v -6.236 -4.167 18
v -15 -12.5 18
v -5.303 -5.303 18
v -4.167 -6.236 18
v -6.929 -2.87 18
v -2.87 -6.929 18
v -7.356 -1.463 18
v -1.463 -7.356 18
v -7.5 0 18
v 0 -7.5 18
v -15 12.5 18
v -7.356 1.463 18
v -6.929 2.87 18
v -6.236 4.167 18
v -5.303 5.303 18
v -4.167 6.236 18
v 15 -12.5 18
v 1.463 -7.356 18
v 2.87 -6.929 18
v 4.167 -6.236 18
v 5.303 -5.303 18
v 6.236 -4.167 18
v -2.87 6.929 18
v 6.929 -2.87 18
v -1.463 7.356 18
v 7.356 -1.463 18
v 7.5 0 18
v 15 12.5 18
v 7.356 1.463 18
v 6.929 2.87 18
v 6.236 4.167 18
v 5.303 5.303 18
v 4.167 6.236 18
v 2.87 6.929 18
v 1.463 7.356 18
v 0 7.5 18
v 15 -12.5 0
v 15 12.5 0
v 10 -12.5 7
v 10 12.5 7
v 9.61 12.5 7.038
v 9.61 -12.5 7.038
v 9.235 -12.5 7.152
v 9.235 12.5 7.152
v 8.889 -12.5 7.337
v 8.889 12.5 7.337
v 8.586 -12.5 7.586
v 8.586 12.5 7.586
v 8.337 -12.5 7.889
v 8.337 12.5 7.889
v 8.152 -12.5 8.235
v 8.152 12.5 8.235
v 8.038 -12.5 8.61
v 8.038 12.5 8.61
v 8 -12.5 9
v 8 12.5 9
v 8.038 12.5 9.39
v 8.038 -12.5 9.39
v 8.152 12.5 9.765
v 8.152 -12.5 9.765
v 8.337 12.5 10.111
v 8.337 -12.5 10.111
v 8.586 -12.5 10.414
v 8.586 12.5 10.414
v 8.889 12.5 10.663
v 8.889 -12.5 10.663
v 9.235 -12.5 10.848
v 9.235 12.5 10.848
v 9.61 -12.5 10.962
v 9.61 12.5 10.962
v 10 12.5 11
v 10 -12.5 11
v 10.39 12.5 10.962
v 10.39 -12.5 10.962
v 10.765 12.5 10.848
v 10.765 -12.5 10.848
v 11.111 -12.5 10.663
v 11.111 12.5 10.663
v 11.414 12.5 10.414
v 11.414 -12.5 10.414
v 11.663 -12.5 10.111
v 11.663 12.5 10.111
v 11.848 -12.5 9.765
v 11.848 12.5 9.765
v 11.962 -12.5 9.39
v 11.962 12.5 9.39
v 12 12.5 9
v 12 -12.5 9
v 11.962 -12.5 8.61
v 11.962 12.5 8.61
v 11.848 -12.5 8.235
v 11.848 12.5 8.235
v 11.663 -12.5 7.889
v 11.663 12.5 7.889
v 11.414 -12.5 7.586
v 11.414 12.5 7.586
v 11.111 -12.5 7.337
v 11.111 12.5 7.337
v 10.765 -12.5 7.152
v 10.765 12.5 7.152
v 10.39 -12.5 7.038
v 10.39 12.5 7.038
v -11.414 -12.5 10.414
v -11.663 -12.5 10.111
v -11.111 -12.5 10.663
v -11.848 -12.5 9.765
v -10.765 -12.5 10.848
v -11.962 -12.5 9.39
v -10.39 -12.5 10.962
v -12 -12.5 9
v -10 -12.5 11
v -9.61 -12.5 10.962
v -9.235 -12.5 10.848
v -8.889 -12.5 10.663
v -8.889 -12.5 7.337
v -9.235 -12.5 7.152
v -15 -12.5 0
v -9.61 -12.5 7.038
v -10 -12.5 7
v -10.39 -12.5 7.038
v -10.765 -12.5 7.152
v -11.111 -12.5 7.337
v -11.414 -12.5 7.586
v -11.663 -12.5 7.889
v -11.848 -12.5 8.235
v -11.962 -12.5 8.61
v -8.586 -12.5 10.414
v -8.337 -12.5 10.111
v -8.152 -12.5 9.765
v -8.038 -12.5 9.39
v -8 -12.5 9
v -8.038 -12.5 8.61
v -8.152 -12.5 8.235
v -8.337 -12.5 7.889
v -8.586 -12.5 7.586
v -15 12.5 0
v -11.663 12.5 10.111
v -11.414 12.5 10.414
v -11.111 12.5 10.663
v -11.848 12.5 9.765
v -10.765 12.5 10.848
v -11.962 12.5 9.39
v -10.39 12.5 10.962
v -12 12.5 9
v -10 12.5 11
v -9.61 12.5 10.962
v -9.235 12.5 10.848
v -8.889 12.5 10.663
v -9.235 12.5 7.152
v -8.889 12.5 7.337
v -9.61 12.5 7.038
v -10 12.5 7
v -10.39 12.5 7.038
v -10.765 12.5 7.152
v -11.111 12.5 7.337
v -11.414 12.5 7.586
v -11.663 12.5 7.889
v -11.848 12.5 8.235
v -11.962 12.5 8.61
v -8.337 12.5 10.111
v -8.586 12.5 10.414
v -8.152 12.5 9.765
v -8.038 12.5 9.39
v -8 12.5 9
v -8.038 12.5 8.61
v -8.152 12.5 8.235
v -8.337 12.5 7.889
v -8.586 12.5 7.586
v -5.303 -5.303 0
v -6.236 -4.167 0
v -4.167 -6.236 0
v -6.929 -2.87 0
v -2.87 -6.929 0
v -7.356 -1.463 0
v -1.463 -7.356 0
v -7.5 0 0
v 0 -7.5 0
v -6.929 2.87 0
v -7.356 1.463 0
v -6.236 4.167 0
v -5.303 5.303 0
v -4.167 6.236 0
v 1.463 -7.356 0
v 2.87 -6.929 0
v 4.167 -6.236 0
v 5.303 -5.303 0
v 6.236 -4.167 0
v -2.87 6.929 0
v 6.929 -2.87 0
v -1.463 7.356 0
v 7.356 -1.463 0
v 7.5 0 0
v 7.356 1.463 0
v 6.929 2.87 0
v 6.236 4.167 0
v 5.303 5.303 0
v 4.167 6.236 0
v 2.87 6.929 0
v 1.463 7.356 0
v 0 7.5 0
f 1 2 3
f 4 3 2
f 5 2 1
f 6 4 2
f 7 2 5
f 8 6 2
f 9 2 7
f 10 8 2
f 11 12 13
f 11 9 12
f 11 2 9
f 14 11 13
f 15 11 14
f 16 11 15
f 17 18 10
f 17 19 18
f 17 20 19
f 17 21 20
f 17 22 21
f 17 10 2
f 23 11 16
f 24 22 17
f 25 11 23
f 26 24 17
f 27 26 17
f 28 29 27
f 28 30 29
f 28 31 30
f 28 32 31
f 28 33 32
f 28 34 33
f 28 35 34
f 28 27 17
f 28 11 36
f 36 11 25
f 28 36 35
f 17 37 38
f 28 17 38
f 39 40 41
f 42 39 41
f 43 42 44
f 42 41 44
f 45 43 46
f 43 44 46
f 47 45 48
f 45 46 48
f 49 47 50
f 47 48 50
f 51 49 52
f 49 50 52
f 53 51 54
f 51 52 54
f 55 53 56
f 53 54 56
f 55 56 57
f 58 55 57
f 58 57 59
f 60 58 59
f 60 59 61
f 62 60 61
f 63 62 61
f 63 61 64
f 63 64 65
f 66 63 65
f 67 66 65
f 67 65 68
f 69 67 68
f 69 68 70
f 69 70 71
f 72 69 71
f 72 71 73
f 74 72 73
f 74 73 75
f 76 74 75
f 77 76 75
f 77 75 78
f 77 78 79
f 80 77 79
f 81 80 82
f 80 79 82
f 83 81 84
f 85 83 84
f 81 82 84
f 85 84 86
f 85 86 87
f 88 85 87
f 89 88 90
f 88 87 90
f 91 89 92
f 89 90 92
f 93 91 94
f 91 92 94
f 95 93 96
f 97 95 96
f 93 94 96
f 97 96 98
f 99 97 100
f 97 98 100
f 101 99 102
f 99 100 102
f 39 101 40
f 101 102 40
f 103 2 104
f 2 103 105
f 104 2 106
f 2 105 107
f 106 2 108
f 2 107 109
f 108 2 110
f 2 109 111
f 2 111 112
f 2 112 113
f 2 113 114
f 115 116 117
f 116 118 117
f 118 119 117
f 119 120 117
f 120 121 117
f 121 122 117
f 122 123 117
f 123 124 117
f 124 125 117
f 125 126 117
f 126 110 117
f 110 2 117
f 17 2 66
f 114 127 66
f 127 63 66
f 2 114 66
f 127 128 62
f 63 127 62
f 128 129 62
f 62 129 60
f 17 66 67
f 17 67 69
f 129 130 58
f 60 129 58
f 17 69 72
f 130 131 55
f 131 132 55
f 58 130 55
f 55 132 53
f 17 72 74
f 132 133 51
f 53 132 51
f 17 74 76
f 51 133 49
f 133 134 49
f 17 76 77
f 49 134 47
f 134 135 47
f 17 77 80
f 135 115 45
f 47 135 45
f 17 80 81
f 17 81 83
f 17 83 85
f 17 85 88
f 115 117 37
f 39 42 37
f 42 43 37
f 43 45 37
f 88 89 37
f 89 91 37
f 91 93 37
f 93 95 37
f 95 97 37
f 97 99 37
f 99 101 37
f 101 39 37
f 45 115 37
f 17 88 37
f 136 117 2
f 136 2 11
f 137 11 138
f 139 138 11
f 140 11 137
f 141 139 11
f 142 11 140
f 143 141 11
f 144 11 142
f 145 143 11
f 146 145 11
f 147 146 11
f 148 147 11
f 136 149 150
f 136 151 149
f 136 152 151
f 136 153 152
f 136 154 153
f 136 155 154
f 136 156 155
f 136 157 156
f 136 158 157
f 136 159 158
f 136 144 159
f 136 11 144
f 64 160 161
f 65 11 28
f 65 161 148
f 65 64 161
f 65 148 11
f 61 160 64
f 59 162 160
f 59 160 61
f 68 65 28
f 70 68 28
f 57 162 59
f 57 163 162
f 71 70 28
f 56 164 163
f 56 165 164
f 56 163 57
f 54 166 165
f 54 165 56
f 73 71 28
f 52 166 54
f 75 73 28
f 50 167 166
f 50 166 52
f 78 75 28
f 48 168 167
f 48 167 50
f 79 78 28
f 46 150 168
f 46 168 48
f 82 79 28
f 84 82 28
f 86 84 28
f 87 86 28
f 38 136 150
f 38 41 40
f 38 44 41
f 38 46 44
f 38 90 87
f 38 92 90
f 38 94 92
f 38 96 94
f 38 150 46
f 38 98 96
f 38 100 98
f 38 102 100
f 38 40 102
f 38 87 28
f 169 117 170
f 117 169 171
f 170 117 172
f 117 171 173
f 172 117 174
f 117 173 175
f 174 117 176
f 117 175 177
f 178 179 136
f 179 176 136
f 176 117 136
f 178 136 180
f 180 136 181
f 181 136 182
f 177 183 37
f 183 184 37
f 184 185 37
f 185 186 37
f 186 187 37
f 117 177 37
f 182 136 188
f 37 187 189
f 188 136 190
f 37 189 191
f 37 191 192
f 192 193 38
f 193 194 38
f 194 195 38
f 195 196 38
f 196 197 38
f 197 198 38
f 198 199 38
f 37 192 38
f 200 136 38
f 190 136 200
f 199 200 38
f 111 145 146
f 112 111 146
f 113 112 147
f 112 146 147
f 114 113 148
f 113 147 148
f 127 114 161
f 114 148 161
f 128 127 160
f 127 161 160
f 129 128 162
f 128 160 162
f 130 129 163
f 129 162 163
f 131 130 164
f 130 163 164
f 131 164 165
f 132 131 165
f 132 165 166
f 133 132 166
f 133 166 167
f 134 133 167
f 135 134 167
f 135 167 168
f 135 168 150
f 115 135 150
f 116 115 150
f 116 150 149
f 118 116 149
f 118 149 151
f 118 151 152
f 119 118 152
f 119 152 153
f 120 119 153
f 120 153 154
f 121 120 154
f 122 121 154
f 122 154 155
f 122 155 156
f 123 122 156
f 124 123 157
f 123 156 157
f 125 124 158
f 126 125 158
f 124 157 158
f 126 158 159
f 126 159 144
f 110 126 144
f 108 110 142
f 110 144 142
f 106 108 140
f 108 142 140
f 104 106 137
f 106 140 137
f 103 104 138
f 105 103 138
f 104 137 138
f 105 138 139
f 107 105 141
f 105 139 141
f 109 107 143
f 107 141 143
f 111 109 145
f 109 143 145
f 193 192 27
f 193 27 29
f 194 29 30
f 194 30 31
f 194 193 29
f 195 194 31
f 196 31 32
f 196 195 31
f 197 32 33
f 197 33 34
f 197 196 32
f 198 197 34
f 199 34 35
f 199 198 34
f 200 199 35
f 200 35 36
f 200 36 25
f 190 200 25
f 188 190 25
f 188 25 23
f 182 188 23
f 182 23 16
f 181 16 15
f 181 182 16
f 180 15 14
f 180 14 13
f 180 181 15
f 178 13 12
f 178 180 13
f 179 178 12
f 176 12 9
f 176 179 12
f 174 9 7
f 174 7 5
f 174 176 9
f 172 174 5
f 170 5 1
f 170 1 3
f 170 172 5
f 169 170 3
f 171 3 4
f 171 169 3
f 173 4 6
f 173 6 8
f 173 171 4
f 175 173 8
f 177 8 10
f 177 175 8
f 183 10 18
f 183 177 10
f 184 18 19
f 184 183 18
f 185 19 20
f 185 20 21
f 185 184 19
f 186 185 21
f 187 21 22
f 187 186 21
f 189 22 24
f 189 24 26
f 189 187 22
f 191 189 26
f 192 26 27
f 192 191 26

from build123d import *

# Parameters (mm, degrees)
SKETCH1_W           = 30
SKETCH1_H           = 25
SKETCH1_R           = 7.5
BOSS_EXTRUDE1_DEPTH = 18
SKETCH3_R           = 2
CUT_EXTRUDE1_DEPTH  = 35.263683398


with BuildPart() as part:
    # Sketch1 → Boss-Extrude1 (new body)
    with BuildSketch(Plane.XY):
        Rectangle(SKETCH1_W, SKETCH1_H)
        Circle(SKETCH1_R, mode=Mode.SUBTRACT)
    extrude(amount=BOSS_EXTRUDE1_DEPTH)

    # Sketch3 → Cut-Extrude1 (cut, through all)
    with BuildSketch(Plane(origin=(0, 12.5, 0), x_dir=(1, 0, 0), z_dir=(0, 1, 0))):
        with Locations(Location((-10, -9, 0), (0, 0, 270))):
            Circle(SKETCH3_R)
        with Locations(Location((10, -9, 0), (0, 0, 90))):
            Circle(SKETCH3_R)
    extrude(amount=-CUT_EXTRUDE1_DEPTH, mode=Mode.SUBTRACT)


solid = part.part
